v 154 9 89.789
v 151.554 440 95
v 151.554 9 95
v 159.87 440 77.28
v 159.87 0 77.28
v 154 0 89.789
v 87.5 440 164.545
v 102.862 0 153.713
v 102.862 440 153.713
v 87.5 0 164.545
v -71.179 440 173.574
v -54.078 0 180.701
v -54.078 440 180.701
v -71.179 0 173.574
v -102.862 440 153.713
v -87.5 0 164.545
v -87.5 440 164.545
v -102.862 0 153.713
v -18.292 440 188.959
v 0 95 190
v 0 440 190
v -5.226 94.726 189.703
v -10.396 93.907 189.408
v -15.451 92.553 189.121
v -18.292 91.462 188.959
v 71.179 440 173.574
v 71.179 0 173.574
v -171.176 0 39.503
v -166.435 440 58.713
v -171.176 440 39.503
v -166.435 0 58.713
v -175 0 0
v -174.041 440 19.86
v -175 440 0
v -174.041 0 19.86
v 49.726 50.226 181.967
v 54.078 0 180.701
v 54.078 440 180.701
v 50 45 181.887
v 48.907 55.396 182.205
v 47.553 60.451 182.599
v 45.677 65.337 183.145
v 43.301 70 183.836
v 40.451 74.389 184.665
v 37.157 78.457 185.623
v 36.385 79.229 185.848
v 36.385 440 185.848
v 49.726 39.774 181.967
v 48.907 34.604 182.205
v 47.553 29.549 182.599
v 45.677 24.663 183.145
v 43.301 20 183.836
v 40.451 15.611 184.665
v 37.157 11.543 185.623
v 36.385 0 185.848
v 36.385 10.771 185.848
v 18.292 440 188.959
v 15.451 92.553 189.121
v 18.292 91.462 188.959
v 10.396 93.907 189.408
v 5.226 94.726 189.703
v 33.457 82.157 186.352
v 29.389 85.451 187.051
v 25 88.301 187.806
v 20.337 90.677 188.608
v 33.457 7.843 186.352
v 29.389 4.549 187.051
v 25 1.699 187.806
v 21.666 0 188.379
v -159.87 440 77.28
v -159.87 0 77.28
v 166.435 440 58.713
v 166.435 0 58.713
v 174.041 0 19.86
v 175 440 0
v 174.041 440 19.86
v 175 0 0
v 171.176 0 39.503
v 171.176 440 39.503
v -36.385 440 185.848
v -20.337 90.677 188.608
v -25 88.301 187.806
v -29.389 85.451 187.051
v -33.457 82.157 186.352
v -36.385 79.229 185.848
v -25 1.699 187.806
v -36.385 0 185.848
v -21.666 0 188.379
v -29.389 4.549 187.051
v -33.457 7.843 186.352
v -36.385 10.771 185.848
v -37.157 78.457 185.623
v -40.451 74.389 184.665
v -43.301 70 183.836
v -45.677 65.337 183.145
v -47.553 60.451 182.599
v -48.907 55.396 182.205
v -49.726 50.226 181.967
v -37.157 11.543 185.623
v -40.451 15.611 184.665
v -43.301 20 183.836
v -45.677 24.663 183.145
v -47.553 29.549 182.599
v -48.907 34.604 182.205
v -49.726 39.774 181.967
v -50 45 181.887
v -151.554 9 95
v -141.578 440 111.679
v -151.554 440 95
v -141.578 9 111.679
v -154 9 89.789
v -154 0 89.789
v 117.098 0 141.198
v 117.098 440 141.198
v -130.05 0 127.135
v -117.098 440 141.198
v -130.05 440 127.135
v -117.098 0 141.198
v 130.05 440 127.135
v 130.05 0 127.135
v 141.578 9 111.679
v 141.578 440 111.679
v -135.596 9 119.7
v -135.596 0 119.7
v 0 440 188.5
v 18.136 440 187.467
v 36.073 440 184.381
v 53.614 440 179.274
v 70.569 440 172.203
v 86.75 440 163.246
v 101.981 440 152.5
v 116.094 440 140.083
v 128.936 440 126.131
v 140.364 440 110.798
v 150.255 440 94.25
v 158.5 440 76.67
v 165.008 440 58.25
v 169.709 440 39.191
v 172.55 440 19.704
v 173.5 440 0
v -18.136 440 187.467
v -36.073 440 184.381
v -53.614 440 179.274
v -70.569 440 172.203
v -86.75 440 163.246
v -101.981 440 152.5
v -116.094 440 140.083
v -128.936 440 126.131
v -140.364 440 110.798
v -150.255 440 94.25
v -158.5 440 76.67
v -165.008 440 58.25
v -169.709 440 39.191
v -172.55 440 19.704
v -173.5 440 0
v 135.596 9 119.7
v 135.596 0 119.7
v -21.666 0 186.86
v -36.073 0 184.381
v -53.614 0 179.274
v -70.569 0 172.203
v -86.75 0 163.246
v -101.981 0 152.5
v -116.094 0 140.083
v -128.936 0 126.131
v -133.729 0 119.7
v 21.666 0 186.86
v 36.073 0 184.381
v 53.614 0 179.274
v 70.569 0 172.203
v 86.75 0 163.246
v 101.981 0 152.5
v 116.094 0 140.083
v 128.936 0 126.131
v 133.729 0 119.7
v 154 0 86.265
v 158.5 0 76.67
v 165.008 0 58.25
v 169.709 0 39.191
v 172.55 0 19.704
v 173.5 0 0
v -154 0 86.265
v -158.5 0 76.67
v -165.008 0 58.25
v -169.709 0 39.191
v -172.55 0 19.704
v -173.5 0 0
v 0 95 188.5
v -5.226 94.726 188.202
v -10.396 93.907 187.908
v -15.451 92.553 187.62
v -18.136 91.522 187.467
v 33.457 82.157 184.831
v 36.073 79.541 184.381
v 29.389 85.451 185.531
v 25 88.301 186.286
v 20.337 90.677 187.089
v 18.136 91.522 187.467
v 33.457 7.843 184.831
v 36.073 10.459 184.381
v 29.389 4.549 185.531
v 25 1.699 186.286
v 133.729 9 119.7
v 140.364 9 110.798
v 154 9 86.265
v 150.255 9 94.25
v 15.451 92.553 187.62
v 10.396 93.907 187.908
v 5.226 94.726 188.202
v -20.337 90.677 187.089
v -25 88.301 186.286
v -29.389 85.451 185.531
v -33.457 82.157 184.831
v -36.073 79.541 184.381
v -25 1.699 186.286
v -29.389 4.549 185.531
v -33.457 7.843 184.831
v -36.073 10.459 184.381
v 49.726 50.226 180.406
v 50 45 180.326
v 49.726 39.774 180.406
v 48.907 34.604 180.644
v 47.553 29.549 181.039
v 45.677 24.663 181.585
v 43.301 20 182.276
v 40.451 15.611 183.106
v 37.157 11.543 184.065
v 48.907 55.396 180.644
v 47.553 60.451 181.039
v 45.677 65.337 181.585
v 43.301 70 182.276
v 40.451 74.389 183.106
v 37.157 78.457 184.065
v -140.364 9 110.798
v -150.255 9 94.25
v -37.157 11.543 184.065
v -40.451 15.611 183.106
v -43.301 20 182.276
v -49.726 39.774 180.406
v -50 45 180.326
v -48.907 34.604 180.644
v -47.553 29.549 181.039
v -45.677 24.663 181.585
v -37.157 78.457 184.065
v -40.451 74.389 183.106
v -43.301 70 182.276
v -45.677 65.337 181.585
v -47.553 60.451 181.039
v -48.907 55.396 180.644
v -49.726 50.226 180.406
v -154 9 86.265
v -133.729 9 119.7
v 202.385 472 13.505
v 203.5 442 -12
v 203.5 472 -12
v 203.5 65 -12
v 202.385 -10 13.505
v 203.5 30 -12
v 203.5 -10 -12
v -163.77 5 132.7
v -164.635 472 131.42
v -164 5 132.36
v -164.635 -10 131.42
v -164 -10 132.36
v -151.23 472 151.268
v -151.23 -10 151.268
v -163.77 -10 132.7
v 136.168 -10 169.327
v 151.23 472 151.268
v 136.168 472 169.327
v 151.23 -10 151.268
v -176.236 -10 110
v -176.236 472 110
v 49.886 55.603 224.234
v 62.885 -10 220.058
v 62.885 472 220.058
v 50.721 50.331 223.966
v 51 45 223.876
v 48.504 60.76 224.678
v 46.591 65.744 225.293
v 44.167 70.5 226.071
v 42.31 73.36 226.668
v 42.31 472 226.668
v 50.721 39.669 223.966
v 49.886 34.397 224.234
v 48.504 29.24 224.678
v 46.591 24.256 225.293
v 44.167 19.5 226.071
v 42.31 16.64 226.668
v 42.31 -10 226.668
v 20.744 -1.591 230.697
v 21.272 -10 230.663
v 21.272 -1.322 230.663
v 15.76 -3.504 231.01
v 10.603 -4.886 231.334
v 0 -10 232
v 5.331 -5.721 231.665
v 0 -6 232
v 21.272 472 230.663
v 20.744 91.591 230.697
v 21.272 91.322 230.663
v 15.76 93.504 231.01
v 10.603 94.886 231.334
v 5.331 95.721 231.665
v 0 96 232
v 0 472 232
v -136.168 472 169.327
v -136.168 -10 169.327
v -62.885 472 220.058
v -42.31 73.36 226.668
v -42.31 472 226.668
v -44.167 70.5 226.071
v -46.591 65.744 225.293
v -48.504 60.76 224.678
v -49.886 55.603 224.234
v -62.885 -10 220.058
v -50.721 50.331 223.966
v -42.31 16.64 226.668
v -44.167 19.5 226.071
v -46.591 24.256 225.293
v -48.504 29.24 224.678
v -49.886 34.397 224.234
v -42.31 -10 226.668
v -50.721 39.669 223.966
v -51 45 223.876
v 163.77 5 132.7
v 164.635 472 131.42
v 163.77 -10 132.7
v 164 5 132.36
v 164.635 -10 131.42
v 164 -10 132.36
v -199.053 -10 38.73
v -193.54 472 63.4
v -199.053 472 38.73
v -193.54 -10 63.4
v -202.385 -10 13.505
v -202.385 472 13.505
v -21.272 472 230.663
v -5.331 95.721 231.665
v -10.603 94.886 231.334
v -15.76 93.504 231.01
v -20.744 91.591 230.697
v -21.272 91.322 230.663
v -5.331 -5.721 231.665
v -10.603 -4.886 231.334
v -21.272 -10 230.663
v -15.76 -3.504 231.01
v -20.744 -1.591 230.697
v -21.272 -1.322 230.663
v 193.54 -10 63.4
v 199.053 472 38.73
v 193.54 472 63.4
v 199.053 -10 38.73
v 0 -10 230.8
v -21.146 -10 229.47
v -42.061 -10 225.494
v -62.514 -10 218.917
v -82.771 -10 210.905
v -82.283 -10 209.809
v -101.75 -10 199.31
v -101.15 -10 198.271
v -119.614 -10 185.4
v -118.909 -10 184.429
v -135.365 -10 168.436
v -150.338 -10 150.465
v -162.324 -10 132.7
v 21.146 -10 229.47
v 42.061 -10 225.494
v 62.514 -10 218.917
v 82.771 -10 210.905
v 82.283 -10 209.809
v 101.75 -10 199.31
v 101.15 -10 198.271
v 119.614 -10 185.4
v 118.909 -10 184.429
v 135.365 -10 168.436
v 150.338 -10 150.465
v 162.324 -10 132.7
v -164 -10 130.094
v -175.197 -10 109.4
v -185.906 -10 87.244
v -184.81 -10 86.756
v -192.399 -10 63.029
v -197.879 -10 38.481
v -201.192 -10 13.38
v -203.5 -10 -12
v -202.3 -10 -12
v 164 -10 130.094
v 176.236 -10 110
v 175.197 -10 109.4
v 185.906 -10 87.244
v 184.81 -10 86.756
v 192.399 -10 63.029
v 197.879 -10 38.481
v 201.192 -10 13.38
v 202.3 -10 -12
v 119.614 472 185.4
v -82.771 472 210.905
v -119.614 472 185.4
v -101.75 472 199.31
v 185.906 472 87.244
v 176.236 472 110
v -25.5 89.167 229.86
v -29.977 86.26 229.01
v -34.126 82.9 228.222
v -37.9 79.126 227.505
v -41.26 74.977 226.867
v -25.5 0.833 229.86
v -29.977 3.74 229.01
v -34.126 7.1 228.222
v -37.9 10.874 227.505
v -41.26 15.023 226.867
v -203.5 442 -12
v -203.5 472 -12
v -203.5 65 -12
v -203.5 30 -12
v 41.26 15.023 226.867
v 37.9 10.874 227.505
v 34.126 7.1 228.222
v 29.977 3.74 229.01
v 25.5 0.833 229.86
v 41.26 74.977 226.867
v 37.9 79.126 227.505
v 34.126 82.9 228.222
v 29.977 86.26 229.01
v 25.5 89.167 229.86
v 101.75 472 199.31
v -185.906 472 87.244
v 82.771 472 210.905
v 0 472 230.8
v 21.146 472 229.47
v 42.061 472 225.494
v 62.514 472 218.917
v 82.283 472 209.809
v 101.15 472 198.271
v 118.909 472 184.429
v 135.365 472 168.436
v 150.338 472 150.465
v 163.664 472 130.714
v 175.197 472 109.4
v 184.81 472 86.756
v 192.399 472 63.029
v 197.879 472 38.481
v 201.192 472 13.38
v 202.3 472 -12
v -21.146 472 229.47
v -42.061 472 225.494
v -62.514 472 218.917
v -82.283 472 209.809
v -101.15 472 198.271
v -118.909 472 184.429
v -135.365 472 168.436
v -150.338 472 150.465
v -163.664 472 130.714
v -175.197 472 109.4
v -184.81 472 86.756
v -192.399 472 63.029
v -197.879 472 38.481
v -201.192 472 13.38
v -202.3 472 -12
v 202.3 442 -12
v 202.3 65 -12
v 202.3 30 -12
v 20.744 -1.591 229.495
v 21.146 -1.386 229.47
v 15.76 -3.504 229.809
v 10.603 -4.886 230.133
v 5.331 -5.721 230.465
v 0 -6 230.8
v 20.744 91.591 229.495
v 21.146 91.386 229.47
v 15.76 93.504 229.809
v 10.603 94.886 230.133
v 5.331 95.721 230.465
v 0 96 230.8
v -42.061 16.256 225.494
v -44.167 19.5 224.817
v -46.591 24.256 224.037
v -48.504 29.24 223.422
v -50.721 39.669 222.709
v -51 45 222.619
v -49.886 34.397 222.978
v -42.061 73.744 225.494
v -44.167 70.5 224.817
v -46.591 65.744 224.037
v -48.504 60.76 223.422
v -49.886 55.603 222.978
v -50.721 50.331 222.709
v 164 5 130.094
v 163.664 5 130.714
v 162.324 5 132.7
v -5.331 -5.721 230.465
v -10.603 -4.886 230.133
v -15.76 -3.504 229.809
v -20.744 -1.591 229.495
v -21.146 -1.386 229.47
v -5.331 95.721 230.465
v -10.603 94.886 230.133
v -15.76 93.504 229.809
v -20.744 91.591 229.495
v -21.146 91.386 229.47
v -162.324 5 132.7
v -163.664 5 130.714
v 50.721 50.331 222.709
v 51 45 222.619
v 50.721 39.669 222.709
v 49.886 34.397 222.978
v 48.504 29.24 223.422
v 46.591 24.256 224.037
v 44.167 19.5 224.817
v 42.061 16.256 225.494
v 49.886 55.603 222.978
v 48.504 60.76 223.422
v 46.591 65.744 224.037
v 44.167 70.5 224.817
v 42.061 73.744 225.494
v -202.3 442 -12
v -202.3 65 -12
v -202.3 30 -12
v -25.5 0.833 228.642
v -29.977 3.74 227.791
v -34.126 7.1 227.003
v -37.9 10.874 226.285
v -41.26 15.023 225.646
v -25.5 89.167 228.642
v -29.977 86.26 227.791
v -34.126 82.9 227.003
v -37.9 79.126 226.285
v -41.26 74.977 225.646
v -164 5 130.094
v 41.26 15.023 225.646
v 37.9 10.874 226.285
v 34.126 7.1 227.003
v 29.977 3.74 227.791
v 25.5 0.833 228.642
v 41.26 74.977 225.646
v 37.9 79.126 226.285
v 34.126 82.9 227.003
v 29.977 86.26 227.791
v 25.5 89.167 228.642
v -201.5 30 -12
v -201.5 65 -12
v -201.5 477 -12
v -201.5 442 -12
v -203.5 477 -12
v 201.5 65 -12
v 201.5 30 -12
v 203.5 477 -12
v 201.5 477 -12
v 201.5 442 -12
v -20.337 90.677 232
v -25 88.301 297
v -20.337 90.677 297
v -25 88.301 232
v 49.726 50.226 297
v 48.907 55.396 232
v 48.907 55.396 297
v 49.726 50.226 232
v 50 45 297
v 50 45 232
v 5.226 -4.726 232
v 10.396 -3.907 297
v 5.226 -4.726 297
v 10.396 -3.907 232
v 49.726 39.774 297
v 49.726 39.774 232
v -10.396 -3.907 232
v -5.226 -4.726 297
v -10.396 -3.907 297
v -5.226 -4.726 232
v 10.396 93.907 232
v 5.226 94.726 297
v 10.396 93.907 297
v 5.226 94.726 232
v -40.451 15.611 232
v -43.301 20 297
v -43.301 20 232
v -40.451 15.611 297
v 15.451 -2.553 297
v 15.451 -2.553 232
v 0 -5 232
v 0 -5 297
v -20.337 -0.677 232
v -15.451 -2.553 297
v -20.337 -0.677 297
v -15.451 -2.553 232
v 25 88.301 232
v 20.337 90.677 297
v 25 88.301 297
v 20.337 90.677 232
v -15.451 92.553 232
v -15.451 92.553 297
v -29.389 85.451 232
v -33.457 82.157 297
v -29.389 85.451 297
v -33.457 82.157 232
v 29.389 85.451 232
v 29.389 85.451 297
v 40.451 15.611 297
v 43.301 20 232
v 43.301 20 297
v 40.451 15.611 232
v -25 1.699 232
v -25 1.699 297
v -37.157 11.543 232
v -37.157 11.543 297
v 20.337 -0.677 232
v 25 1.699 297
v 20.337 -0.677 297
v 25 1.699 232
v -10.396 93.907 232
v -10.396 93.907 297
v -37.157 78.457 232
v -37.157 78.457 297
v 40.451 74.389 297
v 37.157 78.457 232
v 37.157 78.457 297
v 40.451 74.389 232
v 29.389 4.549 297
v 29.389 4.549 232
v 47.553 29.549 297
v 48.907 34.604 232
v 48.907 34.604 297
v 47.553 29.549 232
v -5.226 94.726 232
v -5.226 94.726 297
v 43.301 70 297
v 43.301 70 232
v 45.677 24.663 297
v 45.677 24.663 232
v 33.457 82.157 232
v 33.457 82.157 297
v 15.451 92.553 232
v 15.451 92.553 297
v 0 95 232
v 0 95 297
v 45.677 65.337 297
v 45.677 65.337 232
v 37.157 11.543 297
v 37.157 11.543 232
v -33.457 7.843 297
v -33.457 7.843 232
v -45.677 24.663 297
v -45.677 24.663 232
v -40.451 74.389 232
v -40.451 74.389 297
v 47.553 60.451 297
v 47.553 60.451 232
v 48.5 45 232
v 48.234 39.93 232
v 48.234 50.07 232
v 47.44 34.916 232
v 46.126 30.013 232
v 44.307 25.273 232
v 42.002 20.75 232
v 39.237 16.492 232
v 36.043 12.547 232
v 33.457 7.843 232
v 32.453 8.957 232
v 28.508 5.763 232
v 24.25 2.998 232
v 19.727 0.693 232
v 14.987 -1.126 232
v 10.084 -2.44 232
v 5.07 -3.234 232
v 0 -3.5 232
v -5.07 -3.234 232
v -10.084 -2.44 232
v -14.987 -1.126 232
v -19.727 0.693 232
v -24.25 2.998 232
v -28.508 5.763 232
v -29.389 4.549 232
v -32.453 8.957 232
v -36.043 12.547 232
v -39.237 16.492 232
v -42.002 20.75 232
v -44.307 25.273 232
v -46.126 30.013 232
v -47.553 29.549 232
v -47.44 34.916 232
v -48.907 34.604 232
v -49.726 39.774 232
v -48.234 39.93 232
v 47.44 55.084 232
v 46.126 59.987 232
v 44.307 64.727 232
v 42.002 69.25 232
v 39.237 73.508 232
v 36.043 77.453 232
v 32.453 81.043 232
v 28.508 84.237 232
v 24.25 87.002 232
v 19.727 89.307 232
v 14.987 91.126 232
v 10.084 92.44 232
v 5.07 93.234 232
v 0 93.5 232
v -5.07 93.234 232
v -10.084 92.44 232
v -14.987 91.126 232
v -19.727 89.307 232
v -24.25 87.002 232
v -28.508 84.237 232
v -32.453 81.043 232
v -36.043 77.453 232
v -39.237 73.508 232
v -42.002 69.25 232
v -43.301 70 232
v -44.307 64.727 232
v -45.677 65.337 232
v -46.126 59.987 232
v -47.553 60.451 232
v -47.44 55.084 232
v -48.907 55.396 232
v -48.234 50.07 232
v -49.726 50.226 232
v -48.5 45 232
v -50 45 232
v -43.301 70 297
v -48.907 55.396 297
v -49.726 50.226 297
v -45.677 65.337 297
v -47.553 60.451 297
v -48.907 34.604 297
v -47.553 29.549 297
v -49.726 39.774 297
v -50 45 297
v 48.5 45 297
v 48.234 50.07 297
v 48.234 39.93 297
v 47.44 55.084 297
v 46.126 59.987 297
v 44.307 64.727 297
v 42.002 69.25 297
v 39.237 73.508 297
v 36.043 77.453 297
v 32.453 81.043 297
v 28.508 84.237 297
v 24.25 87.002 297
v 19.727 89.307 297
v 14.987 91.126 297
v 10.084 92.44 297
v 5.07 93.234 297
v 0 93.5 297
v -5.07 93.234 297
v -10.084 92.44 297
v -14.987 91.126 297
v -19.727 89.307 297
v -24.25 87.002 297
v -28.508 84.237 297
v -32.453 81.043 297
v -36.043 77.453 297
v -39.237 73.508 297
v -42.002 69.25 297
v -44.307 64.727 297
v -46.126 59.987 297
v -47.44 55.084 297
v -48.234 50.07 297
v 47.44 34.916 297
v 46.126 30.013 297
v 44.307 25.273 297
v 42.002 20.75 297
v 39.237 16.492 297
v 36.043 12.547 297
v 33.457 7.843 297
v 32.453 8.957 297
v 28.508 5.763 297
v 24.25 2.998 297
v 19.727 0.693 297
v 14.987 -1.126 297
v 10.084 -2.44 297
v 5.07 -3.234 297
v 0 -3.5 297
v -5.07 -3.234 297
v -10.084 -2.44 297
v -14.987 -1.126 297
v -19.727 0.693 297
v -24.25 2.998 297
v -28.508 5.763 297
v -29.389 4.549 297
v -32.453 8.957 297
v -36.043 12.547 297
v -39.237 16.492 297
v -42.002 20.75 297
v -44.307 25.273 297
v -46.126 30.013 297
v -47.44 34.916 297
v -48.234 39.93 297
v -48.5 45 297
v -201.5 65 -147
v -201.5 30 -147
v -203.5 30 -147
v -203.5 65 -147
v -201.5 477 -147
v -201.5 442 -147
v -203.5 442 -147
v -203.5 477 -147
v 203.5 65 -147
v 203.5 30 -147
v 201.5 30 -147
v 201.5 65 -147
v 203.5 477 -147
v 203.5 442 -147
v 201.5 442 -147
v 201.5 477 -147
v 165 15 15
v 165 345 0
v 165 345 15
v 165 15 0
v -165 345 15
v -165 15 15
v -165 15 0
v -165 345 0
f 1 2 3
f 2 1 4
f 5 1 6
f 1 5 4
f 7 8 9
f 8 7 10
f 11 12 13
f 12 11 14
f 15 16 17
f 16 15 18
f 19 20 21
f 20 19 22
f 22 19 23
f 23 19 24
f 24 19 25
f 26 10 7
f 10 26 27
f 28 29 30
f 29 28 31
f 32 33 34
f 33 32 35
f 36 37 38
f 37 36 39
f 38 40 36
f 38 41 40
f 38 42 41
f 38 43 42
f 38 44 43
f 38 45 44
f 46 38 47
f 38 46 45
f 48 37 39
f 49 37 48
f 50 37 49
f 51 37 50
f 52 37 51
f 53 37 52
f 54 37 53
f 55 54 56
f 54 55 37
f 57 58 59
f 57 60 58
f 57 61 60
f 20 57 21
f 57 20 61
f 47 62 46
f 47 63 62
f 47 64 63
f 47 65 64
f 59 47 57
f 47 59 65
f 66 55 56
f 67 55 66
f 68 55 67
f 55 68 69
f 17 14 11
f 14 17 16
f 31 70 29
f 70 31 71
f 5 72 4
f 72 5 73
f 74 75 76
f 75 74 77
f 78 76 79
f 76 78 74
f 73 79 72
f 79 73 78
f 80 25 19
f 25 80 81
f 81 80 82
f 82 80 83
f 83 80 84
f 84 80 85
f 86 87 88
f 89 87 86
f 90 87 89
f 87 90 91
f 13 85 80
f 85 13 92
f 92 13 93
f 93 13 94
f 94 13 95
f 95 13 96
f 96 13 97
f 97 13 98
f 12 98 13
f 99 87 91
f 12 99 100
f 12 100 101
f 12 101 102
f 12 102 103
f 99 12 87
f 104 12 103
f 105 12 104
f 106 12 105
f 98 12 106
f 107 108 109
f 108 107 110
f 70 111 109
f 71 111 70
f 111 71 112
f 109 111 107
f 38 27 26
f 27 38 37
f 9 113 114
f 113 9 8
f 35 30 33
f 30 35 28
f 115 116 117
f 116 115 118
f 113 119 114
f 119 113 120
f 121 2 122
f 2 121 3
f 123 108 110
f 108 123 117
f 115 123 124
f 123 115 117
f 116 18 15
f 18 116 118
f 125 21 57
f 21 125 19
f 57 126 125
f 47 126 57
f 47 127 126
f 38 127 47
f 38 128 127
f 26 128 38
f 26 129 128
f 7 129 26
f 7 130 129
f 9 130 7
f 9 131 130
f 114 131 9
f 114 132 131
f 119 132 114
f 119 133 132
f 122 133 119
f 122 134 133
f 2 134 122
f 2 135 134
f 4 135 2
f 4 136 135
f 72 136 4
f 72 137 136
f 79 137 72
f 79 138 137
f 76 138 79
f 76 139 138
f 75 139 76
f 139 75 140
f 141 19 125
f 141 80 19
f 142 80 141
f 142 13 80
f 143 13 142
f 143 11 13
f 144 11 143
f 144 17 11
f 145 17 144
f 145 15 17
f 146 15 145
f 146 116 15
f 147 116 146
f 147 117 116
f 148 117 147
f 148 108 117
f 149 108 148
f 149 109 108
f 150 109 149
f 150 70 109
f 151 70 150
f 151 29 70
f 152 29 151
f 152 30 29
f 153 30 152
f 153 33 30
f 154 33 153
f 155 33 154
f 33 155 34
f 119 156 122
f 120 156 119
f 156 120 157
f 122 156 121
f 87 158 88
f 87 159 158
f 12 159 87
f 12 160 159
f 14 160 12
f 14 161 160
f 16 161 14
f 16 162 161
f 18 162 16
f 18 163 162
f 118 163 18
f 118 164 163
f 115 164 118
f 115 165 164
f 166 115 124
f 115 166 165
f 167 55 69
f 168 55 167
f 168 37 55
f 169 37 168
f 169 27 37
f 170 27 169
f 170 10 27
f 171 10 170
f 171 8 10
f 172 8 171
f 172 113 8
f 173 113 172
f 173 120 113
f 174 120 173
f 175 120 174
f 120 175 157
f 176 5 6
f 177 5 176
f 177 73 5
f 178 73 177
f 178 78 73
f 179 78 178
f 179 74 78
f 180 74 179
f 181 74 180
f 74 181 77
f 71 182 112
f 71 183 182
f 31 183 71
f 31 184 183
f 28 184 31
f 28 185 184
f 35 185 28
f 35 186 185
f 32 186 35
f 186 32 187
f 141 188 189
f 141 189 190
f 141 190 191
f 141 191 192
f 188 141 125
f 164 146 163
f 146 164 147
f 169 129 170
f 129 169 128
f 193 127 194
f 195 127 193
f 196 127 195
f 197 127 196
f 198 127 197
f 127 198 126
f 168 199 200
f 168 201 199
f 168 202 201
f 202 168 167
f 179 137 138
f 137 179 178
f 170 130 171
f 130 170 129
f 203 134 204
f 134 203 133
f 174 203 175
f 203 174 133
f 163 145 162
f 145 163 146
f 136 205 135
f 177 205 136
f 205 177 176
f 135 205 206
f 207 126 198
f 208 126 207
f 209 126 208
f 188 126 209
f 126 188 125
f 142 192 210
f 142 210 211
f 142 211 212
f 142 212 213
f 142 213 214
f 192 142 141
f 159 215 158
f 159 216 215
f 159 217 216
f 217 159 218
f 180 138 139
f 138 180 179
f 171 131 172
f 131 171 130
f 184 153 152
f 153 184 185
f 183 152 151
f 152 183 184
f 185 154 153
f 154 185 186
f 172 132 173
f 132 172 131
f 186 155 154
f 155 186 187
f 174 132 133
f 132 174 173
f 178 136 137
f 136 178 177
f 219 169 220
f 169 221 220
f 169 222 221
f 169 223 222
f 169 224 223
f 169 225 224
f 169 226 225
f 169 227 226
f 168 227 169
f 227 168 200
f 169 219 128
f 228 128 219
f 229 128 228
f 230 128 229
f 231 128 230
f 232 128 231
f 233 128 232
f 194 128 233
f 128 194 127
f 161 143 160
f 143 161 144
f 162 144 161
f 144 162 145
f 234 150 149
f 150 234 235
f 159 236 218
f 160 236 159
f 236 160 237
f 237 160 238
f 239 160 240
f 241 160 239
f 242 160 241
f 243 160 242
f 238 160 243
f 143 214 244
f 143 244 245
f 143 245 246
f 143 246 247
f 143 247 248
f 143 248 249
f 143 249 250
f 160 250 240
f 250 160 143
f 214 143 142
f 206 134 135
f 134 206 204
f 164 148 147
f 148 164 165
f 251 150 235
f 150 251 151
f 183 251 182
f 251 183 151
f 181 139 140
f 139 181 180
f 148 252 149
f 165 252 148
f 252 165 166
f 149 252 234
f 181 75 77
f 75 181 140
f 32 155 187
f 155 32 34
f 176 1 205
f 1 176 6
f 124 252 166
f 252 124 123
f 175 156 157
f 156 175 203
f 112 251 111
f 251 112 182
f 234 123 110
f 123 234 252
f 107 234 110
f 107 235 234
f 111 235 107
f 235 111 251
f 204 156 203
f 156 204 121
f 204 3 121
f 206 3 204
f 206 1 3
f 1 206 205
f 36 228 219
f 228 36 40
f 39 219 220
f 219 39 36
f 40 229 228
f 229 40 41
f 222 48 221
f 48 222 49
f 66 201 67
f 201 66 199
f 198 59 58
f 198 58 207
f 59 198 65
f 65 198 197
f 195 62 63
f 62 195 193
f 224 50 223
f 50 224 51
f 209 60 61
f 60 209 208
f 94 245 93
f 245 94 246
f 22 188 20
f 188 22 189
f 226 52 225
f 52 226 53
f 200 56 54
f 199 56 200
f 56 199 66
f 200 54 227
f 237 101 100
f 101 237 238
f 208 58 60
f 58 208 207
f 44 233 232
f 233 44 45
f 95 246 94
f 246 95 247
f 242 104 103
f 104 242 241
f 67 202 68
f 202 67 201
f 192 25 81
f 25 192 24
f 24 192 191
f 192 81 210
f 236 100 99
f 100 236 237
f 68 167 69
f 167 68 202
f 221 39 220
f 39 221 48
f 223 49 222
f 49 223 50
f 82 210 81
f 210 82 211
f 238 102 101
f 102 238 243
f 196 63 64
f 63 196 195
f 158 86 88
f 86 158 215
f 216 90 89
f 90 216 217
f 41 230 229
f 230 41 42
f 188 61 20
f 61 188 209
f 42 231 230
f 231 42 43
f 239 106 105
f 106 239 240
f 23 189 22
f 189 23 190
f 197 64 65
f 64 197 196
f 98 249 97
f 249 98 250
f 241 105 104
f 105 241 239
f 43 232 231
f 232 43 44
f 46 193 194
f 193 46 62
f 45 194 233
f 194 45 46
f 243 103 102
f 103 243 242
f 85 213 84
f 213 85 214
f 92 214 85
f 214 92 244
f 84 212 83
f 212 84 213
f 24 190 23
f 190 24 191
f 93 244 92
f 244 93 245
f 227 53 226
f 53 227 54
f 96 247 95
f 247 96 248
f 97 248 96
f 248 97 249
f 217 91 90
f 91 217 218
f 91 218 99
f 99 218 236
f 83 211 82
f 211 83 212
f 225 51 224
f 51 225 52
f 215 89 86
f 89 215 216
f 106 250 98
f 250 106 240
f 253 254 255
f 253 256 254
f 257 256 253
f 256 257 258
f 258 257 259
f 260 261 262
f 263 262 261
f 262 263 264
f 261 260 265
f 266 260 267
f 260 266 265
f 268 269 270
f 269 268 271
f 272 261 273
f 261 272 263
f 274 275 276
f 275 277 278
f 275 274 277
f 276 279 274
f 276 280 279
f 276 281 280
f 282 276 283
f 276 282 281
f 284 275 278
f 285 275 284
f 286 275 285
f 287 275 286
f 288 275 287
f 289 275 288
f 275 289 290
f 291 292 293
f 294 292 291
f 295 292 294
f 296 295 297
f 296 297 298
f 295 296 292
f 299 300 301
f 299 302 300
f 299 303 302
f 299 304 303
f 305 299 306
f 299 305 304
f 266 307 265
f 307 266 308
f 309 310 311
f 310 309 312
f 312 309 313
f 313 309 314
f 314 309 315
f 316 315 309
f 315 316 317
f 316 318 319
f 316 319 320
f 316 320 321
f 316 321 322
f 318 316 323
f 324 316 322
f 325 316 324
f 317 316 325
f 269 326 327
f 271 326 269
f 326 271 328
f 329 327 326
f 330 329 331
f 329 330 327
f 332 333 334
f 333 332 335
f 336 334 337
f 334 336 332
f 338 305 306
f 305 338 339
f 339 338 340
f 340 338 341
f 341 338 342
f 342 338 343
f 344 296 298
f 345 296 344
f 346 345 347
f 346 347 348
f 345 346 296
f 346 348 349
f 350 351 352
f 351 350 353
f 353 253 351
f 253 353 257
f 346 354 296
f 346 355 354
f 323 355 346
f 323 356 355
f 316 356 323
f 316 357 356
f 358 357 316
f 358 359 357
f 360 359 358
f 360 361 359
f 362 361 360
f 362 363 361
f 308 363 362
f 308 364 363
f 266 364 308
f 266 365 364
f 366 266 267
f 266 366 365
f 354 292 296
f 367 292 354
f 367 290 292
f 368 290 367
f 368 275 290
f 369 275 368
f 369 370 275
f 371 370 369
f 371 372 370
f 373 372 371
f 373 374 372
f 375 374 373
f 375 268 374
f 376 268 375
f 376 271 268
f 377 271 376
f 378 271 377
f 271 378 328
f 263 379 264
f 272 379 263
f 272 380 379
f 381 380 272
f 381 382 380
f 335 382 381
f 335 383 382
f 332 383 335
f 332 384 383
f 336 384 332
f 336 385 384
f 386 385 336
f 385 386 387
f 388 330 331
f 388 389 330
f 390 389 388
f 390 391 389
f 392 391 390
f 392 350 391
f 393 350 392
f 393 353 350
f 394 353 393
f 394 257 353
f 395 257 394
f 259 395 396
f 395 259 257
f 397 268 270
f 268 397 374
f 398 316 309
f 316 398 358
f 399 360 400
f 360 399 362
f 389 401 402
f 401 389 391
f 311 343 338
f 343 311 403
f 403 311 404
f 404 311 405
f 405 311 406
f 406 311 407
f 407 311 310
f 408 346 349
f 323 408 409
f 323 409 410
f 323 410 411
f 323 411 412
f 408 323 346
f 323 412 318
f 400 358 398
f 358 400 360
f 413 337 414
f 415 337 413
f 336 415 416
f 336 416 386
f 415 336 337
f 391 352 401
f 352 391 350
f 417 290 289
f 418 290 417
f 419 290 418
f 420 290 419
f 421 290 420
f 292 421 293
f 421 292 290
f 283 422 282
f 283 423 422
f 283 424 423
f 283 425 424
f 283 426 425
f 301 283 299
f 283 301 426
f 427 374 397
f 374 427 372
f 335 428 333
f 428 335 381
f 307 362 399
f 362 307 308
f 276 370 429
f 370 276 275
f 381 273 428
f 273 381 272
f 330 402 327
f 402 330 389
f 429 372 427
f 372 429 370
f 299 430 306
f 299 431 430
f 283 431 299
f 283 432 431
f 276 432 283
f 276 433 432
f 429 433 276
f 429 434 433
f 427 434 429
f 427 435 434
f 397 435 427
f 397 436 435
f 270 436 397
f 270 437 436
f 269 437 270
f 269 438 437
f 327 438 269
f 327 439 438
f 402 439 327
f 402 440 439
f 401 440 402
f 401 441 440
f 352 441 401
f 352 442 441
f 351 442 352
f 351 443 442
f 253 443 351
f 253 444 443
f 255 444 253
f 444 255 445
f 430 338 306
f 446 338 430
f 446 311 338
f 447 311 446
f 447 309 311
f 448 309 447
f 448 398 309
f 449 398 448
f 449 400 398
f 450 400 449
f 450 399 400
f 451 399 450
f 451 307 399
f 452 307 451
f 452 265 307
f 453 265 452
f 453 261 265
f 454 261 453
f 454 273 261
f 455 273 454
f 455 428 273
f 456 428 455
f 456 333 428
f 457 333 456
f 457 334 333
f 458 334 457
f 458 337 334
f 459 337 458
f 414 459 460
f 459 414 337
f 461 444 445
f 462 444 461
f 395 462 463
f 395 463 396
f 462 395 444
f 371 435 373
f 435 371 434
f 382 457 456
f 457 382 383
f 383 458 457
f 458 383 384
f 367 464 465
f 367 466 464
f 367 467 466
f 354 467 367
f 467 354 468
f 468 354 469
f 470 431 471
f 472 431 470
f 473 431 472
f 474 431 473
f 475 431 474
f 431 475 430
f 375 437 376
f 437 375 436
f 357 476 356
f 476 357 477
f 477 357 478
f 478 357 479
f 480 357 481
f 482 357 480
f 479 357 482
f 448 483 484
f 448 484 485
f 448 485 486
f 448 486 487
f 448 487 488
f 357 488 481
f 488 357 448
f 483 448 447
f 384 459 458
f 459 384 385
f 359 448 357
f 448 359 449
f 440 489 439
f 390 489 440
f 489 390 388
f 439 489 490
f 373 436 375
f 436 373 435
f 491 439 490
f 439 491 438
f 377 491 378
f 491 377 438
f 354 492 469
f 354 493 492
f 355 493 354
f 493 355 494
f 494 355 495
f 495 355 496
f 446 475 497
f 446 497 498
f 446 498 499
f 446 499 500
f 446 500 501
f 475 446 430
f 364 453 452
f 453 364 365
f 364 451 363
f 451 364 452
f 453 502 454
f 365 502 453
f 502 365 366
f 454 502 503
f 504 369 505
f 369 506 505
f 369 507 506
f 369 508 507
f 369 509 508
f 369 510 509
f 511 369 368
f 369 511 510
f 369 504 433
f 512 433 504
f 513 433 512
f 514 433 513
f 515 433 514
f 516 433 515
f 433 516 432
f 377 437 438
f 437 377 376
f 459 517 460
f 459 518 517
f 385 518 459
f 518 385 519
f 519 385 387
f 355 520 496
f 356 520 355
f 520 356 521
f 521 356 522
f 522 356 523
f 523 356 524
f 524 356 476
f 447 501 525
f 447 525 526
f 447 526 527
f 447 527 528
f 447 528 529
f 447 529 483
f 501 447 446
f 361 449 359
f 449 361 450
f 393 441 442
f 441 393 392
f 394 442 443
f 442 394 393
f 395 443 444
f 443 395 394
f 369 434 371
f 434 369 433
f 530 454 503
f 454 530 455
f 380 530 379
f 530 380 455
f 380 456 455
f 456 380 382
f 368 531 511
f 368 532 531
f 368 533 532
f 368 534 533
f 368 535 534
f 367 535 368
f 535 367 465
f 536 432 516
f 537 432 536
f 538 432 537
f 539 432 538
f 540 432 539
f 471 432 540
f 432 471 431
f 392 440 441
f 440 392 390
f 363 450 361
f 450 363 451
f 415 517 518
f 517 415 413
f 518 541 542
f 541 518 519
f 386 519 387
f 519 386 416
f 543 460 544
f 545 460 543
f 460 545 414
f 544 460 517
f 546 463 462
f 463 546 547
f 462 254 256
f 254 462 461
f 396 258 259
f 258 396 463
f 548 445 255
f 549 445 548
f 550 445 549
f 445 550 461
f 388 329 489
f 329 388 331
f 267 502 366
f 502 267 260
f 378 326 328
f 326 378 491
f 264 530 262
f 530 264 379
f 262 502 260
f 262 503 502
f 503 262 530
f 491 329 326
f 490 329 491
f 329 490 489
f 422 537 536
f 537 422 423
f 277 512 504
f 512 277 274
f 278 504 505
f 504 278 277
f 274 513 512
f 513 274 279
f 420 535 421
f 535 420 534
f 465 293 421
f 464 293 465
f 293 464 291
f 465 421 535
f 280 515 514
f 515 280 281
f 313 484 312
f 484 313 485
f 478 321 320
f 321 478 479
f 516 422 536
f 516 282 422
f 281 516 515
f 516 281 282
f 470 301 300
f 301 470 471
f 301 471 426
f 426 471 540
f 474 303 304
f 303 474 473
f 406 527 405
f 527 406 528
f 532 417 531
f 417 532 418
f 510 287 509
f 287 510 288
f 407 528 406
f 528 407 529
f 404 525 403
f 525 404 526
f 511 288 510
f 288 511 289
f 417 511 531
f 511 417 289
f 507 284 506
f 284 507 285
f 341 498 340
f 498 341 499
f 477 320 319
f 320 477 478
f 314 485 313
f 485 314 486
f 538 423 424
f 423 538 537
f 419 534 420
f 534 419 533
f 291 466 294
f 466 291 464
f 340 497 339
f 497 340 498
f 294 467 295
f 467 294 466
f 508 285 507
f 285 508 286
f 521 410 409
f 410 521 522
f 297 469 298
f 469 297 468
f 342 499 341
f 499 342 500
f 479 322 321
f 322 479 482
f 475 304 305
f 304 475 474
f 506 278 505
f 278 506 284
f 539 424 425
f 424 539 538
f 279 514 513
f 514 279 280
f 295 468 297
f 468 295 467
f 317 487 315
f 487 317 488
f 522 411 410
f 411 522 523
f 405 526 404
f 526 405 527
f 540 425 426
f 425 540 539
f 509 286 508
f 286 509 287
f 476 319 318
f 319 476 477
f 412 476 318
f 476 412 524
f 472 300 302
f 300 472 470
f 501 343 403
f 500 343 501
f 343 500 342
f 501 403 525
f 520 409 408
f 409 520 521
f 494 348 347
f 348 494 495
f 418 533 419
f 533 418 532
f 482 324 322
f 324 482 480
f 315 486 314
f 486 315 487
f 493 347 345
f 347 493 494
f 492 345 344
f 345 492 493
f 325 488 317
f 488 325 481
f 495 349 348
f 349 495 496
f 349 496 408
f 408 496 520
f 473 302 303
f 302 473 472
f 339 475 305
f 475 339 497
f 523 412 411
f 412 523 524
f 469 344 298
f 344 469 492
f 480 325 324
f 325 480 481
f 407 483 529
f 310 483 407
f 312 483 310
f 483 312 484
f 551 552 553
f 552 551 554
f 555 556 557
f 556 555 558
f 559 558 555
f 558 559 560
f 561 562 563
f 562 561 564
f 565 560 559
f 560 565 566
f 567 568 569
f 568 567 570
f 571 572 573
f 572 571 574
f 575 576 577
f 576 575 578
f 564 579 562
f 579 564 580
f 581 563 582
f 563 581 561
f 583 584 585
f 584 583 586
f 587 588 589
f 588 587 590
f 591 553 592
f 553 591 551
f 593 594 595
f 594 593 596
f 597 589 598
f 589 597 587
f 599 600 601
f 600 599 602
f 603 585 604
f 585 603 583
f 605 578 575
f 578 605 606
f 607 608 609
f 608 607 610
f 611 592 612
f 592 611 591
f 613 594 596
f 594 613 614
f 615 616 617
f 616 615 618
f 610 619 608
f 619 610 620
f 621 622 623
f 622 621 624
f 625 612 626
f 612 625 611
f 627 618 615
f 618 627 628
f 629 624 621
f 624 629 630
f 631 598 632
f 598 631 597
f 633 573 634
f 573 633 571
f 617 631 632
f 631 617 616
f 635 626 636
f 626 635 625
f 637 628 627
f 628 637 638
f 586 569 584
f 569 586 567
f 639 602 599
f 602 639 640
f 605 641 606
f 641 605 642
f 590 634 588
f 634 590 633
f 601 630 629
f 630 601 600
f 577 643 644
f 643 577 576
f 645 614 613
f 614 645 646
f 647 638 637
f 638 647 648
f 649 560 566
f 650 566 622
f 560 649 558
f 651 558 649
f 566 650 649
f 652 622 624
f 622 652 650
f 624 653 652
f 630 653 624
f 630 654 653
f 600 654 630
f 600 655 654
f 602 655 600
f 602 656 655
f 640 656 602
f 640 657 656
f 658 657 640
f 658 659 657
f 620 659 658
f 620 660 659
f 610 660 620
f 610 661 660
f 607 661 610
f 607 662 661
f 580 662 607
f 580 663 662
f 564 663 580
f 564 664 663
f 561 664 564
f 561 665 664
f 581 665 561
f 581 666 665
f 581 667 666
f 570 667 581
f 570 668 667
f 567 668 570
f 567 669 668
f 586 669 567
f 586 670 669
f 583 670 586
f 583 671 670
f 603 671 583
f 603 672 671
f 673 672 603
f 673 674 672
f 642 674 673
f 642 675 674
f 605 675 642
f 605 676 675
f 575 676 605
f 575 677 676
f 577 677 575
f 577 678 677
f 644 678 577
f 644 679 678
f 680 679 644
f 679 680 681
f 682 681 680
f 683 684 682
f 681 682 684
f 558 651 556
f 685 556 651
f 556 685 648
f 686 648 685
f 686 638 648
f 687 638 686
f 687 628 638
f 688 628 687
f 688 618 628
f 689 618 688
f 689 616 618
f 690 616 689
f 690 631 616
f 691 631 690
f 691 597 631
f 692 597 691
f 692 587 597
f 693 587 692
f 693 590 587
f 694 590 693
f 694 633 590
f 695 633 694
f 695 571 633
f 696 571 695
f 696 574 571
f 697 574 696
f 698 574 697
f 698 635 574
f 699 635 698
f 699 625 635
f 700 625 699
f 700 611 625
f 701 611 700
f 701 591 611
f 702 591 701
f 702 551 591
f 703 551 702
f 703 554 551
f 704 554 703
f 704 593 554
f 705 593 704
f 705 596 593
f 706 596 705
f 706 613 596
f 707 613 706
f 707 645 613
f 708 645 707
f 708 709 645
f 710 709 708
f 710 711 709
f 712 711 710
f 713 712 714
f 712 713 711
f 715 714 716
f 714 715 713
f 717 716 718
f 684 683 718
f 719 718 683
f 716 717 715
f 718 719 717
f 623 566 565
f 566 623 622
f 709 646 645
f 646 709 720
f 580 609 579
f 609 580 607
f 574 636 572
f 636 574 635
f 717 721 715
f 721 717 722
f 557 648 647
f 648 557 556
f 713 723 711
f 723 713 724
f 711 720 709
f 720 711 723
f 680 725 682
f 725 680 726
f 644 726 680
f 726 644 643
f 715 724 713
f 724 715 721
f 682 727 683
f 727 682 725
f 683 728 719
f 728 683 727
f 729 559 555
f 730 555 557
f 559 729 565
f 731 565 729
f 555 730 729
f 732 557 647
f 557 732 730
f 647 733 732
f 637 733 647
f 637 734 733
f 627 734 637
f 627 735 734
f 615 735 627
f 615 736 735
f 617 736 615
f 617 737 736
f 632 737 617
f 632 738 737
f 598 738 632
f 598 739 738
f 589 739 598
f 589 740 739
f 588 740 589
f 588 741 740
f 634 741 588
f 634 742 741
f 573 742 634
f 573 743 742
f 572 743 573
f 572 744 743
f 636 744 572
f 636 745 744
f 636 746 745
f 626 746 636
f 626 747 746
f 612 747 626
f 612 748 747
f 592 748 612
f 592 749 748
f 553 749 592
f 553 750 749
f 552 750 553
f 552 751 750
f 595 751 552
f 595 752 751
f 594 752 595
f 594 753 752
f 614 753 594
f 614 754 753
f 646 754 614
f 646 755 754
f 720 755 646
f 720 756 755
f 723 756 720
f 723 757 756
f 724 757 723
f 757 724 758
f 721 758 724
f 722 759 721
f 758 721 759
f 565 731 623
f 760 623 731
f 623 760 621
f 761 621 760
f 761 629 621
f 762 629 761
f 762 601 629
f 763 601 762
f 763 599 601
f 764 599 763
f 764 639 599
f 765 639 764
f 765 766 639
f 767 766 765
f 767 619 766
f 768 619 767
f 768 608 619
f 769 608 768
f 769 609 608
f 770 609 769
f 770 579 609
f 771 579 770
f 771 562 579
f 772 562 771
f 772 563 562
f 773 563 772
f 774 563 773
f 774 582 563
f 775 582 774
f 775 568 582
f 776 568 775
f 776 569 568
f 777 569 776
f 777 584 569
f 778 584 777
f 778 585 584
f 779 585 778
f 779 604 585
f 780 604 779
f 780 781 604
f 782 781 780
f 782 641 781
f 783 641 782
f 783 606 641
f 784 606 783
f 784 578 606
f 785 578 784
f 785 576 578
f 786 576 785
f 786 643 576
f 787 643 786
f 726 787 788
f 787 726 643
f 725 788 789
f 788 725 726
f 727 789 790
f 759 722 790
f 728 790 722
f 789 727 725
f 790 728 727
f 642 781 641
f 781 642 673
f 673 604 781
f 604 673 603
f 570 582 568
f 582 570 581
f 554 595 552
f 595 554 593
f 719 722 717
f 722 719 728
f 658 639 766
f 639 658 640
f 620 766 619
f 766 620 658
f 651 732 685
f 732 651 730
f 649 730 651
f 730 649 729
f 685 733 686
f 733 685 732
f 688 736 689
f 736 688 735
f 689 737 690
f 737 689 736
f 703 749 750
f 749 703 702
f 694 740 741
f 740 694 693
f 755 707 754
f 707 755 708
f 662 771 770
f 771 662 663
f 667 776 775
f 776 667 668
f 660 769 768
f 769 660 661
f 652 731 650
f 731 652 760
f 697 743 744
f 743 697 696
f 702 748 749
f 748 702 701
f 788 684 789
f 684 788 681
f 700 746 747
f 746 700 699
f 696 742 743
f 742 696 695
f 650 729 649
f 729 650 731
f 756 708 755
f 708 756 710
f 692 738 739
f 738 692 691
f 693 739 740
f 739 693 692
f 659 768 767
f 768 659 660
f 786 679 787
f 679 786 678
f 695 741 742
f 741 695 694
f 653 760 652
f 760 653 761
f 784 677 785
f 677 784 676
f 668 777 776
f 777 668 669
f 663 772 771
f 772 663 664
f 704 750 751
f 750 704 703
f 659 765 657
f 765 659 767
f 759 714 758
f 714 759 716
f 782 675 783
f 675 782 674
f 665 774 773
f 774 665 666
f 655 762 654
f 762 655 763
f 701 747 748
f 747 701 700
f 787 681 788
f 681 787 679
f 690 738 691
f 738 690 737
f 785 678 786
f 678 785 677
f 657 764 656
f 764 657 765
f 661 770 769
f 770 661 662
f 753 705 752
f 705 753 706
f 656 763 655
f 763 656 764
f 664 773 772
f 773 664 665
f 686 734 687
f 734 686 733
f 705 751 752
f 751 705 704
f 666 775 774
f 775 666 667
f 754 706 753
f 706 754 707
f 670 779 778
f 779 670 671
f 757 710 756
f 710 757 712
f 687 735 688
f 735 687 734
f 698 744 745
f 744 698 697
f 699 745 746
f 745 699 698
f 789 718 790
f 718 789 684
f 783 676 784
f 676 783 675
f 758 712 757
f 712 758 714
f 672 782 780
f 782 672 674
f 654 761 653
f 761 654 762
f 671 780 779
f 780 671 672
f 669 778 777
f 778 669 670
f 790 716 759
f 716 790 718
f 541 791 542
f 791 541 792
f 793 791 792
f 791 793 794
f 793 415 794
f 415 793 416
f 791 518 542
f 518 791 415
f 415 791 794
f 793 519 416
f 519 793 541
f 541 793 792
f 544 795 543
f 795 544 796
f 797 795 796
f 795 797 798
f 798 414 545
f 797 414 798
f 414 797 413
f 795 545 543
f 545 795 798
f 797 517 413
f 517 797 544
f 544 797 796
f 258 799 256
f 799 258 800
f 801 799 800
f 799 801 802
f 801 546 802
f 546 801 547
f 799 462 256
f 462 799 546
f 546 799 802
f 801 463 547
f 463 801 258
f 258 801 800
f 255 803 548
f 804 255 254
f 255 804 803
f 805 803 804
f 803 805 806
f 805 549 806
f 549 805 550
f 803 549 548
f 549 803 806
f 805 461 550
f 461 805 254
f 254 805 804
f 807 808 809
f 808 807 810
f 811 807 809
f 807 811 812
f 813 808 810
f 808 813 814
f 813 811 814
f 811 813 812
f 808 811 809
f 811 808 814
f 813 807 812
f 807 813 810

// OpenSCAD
// OpenSCAD Parametric Neapolitan Pizza Oven Model
// Generated automatically by cad/model_generator.py

$fn = 60;

// Master Parameters
stone_width = 330.0;
stone_depth = 330.0;
stone_thickness = 15.0;

chamber_width = 350.0;
chamber_depth = 440.0;
dome_apex_height = 190.0;
inner_sheet_t = 1.5;

mouth_height = 119.7;
mouth_width = 308.0;

insulation_cavity = 27.0;
outer_sheet_t = 1.2;
outer_width = 407.0;
outer_depth = 482.0;
outer_height = 244.0;

flue_diameter = 100.0;
chimney_collar_h = 65.0;
leg_height = 135.0;

module baking_stone() {
    color([0.85, 0.75, 0.65])
    translate([-stone_width/2, 15, 0])
    cube([stone_width, stone_depth, stone_thickness]);
}

module inner_dome() {
    color([0.85, 0.88, 0.90])
    difference() {
        // Outer arch
        translate([0, 0, 0])
        rotate([-90, 0, 0])
        linear_extrude(chamber_depth)
        scale([chamber_width/2, dome_apex_height])
        circle(r=1);

        // Hollow interior
        translate([0, -1, 0])
        rotate([-90, 0, 0])
        linear_extrude(chamber_depth + 2)
        scale([(chamber_width/2) - inner_sheet_t, dome_apex_height - inner_sheet_t])
        circle(r=1);

        // Flat bottom floor cut
        translate([-chamber_width, -1, -dome_apex_height])
        cube([2 * chamber_width, chamber_depth + 2, dome_apex_height]);

        // Front mouth opening (Neapolitan 63% rule)
        translate([-mouth_width/2, -1, 0])
        cube([mouth_width, 10, mouth_height]);

        // Flue chimney exhaust hole
        translate([0, 45, dome_apex_height - 20])
        cylinder(r=flue_diameter/2, h=50);
    }
}

module outer_shroud() {
    color([0.2, 0.2, 0.22, 0.85])
    difference() {
        translate([0, -10, -12])
        rotate([-90, 0, 0])
        linear_extrude(outer_depth)
        scale([outer_width/2, outer_height])
        circle(r=1);

        // Inner cavity
        translate([0, -12, -12])
        rotate([-90, 0, 0])
        linear_extrude(outer_depth + 4)
        scale([(outer_width/2) - outer_sheet_t, outer_height - outer_sheet_t])
        circle(r=1);

        // Bottom cut
        translate([-outer_width, -15, -outer_height - 12])
        cube([2 * outer_width, outer_depth + 10, outer_height]);

        // Front face opening
        translate([-mouth_width/2 - 10, -15, -12])
        cube([mouth_width + 20, 20, mouth_height + 25]);

        // Flue collar penetration
        translate([0, 45, outer_height - 30])
        cylinder(r=(flue_diameter/2) + 1, h=60);
    }
}

module chimney_collar() {
    color([0.9, 0.9, 0.92])
    translate([0, 45, outer_height - 12])
    difference() {
        cylinder(r=flue_diameter/2, h=chimney_collar_h);
        translate([0, 0, -1])
        cylinder(r=(flue_diameter/2) - 1.5, h=chimney_collar_h + 2);
    }
}

module folding_legs() {
    color([0.7, 0.7, 0.72])
    for (lx = [-outer_width/2, outer_width/2 - 2]) {
        for (ly = [30, outer_depth - 40]) {
            translate([lx, ly, -12 - leg_height])
            cube([2.0, 35.0, leg_height]);
        }
    }
}

// Full Assembly
baking_stone();
inner_dome();
outer_shroud();
chimney_collar();
folding_legs();
